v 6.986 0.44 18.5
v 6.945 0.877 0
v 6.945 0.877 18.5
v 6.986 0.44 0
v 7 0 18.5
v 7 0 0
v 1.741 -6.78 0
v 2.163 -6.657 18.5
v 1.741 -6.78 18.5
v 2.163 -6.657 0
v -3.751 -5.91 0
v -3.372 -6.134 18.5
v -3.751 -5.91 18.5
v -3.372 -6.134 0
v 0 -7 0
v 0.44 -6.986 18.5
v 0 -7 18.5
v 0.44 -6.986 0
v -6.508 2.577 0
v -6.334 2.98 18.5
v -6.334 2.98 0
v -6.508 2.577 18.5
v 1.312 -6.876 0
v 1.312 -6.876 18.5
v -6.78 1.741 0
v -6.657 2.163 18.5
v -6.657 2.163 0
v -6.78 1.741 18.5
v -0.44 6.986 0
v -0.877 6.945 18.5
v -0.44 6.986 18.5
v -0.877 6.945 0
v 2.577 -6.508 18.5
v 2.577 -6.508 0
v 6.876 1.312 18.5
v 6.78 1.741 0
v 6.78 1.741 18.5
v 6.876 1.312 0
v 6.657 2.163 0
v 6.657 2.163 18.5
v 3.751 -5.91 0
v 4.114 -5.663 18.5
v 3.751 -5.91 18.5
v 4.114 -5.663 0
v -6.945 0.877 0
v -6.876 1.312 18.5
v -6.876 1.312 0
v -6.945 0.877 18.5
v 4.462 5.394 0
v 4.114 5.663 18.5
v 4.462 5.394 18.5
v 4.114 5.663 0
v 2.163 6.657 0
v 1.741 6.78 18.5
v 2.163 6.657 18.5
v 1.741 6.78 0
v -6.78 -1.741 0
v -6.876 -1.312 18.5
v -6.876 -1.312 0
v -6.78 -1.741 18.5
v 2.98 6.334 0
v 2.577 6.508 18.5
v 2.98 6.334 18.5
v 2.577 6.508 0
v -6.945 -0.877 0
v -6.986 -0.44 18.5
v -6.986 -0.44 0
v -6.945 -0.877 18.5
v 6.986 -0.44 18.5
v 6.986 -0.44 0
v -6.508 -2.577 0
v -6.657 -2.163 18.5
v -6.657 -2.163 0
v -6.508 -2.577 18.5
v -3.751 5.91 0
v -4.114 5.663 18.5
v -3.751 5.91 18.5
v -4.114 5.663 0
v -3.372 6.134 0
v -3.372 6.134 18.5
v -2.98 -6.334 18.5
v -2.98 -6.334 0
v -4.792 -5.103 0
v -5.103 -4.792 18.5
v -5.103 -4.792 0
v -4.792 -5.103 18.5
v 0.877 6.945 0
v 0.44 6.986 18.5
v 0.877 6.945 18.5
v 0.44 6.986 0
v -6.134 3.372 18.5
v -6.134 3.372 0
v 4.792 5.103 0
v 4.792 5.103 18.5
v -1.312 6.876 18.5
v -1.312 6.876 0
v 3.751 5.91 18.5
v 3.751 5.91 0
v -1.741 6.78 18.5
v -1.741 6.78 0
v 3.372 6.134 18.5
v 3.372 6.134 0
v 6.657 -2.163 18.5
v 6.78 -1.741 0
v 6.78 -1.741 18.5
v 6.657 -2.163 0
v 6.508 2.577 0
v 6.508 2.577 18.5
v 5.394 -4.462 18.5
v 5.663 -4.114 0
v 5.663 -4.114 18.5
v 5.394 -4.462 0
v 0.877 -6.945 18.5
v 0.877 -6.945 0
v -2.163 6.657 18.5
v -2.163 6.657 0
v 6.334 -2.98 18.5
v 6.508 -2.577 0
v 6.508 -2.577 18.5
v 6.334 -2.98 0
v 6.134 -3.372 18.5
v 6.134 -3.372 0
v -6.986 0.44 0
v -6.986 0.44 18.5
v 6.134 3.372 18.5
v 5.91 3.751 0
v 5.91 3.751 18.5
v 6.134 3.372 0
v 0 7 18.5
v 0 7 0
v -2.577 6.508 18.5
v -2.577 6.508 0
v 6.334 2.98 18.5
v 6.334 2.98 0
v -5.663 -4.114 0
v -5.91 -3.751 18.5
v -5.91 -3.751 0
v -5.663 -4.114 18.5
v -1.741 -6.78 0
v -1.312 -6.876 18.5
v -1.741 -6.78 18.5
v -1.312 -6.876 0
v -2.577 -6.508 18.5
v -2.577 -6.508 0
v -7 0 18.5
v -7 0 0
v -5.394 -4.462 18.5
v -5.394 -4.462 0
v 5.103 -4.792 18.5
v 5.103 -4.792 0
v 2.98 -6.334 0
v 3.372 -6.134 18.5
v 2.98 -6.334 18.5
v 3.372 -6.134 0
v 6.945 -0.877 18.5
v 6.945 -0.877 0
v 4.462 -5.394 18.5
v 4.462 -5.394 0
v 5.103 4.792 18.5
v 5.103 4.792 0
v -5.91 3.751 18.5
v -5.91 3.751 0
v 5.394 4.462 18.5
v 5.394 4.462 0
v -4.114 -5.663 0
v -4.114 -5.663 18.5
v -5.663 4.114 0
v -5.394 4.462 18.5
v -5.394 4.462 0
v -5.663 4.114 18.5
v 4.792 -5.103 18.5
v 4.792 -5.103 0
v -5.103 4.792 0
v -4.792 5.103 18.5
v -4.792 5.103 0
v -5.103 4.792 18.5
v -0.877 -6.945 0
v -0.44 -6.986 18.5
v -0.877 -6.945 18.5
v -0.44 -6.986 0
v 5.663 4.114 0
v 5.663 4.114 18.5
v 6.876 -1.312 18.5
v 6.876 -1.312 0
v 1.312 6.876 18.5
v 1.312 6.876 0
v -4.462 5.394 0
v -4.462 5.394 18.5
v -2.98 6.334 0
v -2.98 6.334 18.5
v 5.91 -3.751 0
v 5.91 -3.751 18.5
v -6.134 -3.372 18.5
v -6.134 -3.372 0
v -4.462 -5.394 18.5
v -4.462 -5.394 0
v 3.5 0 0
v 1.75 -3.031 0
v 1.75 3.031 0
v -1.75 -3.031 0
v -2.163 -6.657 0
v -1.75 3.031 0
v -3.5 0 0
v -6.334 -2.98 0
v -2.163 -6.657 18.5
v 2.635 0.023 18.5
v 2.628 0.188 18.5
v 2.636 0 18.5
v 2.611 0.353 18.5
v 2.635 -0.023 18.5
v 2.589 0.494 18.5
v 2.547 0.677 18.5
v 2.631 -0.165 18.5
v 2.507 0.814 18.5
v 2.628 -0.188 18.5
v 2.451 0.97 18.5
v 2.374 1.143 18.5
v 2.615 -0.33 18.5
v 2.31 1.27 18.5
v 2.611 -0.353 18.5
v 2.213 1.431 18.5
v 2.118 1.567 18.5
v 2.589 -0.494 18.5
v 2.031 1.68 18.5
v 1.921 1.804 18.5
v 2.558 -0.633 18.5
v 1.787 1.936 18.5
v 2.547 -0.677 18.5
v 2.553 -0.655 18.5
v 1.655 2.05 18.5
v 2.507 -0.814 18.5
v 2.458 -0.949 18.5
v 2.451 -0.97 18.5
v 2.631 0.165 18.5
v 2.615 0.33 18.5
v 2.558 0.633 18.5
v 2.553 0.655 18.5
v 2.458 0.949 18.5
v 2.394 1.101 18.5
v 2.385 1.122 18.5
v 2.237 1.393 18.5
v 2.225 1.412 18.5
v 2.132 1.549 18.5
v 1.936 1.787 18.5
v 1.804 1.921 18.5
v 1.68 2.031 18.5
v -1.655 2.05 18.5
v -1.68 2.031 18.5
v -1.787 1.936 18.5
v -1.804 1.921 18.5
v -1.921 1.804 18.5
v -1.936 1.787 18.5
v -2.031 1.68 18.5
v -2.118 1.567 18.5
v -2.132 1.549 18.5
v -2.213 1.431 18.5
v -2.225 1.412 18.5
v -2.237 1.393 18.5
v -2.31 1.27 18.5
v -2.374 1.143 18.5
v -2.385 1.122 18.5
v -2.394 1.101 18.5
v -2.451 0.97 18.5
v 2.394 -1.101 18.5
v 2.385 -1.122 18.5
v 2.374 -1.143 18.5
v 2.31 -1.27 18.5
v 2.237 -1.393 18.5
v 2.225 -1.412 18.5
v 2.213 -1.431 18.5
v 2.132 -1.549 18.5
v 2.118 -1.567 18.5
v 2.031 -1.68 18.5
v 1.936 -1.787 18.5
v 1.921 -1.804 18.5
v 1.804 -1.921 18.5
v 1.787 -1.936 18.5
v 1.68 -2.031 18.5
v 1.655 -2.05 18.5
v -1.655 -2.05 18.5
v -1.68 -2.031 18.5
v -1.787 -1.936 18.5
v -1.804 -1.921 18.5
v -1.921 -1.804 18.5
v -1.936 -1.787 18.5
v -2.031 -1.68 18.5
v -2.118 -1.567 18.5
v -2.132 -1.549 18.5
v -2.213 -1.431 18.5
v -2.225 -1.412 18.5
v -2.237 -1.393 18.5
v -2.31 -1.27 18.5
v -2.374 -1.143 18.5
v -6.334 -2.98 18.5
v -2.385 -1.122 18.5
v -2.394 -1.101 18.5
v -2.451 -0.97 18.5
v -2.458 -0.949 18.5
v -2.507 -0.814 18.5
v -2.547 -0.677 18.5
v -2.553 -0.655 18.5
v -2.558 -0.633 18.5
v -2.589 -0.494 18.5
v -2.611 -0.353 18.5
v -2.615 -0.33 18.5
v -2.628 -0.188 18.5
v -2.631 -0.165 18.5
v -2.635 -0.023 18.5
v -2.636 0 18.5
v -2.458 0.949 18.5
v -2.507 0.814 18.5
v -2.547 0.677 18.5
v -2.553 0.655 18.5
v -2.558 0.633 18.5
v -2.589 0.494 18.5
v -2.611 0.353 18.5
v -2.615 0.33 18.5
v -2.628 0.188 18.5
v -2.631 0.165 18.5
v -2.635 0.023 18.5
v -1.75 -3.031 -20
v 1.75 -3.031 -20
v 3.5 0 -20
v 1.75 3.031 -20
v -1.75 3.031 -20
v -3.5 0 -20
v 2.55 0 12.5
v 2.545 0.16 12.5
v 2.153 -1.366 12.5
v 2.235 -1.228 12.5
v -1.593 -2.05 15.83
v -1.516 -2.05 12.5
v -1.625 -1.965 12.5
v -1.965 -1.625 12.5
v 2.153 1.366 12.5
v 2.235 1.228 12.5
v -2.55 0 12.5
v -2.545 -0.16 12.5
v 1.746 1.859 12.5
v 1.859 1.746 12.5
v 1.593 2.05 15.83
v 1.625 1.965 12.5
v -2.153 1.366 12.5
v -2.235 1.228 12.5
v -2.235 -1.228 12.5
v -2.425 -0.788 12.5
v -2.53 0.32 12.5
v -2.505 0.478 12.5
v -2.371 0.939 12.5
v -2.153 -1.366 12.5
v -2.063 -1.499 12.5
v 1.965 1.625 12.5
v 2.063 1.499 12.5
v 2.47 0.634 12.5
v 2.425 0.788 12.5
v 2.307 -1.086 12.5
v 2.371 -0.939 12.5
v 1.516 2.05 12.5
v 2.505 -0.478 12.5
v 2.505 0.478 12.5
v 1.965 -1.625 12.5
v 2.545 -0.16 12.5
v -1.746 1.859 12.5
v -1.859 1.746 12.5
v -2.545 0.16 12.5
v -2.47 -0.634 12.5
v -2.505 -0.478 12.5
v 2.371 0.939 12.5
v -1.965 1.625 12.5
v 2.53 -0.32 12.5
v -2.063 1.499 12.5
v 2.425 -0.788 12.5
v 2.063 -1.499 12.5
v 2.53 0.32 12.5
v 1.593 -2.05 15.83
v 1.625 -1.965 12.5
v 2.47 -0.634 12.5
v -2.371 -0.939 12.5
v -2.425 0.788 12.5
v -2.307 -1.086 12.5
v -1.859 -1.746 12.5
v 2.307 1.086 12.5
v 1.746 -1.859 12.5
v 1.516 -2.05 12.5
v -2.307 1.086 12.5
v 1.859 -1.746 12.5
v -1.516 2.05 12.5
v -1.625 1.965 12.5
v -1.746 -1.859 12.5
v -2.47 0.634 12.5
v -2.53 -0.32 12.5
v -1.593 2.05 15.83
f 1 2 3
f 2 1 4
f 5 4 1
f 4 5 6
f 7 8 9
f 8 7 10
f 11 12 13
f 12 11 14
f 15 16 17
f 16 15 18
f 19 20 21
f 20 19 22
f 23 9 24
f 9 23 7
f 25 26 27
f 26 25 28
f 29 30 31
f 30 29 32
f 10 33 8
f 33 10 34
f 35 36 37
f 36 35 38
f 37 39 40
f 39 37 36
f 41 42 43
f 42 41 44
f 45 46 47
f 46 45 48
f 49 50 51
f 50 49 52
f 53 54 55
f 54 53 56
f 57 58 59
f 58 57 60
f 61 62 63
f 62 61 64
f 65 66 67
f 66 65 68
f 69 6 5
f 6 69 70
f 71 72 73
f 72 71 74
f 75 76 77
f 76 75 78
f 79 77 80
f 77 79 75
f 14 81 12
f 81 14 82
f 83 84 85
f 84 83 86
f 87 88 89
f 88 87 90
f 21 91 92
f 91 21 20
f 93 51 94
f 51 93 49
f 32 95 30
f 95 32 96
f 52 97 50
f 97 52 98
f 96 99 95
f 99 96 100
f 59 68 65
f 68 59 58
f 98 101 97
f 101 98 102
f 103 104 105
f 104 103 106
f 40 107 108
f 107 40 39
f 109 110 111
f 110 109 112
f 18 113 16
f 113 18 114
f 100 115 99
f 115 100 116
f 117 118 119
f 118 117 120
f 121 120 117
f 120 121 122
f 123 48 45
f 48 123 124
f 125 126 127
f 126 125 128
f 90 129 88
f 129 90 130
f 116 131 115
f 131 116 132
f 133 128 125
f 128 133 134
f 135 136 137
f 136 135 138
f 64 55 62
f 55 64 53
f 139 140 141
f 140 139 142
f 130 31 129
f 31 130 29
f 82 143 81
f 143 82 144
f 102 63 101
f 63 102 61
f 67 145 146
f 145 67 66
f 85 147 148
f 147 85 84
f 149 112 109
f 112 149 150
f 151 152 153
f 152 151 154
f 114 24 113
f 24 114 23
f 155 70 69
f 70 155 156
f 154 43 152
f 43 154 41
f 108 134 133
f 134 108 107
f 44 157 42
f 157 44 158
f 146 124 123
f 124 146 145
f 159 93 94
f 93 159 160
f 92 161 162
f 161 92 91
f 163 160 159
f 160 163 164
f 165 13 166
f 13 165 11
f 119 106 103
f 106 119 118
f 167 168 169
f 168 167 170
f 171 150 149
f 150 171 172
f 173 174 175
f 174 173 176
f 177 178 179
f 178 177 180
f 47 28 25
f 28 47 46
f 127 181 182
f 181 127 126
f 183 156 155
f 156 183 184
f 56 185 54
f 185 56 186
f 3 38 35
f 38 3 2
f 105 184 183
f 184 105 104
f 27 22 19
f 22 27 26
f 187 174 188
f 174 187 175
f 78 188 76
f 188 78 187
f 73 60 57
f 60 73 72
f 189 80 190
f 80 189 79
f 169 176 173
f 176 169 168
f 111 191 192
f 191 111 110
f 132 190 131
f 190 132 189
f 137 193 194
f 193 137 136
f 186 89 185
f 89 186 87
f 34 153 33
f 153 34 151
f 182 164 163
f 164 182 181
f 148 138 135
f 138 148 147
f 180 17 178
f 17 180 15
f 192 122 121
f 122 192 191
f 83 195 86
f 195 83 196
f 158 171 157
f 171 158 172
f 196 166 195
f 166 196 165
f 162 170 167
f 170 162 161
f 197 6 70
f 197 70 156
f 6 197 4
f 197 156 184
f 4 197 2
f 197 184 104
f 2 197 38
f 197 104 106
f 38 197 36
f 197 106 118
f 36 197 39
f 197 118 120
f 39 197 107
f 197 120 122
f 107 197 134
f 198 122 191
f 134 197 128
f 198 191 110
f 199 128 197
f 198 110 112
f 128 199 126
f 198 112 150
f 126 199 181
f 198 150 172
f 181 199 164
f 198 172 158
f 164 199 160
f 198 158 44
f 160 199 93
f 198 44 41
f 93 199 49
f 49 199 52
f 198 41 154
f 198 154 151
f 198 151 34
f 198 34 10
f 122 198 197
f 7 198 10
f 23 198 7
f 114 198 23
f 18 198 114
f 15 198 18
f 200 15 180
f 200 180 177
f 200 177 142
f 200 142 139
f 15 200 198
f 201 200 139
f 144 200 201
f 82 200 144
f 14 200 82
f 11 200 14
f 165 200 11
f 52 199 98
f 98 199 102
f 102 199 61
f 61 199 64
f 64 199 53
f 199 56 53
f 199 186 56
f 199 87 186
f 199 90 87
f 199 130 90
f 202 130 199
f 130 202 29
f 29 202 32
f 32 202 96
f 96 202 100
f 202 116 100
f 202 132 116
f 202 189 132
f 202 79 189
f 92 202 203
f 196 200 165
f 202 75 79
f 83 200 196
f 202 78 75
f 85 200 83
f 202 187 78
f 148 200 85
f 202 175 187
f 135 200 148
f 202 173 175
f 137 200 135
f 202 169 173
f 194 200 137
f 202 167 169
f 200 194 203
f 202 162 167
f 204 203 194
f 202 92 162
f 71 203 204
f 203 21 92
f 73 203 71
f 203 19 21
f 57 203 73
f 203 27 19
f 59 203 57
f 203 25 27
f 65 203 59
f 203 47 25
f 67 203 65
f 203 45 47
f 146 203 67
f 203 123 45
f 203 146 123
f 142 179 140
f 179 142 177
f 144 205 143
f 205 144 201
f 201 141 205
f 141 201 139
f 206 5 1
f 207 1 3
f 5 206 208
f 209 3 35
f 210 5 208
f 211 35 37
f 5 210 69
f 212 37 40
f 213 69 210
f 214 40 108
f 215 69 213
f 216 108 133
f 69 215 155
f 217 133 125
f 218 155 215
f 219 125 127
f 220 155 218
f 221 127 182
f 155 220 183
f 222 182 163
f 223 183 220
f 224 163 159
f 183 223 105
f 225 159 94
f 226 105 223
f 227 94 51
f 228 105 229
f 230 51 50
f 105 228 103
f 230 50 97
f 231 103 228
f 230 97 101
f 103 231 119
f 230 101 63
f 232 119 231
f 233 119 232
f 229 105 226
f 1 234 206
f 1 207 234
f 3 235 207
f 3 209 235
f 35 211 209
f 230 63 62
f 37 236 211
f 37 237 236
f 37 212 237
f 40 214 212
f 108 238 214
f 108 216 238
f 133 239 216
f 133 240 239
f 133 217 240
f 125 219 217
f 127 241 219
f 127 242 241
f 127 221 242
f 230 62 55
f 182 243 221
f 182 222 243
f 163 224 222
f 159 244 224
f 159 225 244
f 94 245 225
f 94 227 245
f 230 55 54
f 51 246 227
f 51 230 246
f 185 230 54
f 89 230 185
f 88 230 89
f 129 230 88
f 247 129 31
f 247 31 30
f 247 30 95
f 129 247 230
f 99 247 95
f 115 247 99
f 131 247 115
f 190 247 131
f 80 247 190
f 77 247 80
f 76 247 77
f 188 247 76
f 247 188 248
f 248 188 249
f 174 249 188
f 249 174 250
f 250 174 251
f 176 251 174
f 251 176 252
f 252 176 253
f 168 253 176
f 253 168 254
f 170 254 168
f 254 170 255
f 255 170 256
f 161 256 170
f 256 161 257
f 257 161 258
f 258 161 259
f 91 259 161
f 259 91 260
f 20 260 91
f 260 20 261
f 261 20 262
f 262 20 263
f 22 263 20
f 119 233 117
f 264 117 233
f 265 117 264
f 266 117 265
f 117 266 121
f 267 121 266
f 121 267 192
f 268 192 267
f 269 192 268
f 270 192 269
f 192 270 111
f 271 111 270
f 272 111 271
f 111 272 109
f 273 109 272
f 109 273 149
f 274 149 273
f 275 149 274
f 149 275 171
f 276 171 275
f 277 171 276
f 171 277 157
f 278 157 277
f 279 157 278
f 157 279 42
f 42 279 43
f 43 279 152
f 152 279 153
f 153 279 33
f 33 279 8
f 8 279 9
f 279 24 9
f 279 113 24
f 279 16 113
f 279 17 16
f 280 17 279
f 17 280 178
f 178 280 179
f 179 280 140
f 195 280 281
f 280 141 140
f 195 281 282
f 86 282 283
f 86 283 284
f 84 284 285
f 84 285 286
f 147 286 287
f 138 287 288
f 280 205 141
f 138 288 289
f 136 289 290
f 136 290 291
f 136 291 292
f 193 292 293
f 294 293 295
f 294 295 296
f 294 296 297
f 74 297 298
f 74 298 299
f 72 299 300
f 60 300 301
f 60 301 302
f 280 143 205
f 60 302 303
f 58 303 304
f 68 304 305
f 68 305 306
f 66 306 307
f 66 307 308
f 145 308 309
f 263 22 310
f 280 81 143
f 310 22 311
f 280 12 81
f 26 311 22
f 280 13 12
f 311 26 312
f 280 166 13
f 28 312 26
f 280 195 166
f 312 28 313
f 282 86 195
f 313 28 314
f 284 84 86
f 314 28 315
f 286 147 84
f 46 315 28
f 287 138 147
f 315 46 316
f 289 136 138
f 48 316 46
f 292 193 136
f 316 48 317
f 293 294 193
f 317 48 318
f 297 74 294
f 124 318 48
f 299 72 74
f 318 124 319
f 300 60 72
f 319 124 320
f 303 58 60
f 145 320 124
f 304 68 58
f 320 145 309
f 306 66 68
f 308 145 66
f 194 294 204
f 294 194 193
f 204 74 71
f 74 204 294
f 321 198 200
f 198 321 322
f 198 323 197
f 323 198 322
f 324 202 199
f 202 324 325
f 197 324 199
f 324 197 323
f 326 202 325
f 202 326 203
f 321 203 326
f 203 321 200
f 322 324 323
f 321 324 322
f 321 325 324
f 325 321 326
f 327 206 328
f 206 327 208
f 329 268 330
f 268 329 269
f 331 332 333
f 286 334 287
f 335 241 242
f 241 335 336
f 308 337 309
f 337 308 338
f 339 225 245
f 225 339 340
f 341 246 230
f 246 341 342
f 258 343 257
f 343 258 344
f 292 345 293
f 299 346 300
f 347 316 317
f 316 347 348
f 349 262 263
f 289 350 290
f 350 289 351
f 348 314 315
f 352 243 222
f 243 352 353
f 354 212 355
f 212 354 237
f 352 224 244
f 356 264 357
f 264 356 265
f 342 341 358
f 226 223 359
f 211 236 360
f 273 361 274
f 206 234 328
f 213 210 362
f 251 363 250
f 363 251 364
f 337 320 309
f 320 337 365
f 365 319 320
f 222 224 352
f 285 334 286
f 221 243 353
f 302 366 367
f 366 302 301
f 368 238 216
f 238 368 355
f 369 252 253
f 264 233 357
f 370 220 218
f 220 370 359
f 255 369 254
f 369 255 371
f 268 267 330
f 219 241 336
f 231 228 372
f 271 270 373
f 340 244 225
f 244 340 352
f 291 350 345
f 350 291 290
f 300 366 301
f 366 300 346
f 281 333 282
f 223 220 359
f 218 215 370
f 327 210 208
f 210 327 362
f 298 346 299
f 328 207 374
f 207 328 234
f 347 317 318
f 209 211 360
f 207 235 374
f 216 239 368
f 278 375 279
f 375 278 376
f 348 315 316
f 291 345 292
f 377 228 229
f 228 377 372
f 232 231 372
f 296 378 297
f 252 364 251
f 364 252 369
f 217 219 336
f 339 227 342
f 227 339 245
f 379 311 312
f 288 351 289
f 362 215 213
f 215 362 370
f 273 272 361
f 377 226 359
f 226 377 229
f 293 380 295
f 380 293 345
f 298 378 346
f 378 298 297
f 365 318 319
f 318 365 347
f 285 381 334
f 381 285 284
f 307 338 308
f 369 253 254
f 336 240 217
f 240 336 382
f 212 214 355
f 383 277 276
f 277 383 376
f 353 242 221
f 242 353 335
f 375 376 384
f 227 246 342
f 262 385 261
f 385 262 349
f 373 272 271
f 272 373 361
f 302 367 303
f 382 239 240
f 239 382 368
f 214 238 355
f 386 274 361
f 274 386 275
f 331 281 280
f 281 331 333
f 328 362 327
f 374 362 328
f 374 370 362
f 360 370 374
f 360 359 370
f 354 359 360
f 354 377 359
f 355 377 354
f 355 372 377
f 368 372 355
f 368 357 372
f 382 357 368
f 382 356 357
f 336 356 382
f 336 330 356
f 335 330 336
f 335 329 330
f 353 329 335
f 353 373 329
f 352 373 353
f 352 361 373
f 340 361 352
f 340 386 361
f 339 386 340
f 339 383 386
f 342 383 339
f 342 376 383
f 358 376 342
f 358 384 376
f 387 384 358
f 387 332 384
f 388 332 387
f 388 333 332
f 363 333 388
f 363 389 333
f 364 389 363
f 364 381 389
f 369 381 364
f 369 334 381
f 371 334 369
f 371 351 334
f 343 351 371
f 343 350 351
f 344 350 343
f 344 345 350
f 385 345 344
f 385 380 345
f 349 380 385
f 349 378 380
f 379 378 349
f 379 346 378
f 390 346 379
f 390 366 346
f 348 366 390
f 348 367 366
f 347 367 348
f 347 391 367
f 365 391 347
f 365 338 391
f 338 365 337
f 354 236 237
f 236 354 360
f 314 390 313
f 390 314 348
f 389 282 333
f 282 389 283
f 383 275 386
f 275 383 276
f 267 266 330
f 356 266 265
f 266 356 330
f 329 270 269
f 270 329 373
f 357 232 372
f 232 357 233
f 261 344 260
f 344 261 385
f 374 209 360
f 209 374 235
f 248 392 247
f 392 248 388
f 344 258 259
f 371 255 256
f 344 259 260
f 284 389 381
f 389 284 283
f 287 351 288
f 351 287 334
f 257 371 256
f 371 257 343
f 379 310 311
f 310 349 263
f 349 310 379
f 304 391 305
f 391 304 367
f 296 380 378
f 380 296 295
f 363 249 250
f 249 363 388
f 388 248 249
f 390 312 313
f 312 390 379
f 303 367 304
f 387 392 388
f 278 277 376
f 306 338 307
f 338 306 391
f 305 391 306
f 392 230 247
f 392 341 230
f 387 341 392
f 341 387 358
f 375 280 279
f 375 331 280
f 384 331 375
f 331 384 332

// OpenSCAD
$fn=100;

clutch();

module clutch(){
    // муфта
    difference(){
        union(){
            cylinder(h=36-17.5, d=14.0);
            translate([0,0,-20]) cylinder(h=30, d=7, $fn=6);
        }
        translate([0, 0, 36-17.5-6])
        difference() {
            cylinder(h=7,d1=5.1,d2=5.3);
            translate([0, (2.05 + 10), 3-0.01]) cube(20, center = true);
            translate([0, -(2.05 + 10), 3-0.01]) cube(20, center = true);
        }
    };
}
